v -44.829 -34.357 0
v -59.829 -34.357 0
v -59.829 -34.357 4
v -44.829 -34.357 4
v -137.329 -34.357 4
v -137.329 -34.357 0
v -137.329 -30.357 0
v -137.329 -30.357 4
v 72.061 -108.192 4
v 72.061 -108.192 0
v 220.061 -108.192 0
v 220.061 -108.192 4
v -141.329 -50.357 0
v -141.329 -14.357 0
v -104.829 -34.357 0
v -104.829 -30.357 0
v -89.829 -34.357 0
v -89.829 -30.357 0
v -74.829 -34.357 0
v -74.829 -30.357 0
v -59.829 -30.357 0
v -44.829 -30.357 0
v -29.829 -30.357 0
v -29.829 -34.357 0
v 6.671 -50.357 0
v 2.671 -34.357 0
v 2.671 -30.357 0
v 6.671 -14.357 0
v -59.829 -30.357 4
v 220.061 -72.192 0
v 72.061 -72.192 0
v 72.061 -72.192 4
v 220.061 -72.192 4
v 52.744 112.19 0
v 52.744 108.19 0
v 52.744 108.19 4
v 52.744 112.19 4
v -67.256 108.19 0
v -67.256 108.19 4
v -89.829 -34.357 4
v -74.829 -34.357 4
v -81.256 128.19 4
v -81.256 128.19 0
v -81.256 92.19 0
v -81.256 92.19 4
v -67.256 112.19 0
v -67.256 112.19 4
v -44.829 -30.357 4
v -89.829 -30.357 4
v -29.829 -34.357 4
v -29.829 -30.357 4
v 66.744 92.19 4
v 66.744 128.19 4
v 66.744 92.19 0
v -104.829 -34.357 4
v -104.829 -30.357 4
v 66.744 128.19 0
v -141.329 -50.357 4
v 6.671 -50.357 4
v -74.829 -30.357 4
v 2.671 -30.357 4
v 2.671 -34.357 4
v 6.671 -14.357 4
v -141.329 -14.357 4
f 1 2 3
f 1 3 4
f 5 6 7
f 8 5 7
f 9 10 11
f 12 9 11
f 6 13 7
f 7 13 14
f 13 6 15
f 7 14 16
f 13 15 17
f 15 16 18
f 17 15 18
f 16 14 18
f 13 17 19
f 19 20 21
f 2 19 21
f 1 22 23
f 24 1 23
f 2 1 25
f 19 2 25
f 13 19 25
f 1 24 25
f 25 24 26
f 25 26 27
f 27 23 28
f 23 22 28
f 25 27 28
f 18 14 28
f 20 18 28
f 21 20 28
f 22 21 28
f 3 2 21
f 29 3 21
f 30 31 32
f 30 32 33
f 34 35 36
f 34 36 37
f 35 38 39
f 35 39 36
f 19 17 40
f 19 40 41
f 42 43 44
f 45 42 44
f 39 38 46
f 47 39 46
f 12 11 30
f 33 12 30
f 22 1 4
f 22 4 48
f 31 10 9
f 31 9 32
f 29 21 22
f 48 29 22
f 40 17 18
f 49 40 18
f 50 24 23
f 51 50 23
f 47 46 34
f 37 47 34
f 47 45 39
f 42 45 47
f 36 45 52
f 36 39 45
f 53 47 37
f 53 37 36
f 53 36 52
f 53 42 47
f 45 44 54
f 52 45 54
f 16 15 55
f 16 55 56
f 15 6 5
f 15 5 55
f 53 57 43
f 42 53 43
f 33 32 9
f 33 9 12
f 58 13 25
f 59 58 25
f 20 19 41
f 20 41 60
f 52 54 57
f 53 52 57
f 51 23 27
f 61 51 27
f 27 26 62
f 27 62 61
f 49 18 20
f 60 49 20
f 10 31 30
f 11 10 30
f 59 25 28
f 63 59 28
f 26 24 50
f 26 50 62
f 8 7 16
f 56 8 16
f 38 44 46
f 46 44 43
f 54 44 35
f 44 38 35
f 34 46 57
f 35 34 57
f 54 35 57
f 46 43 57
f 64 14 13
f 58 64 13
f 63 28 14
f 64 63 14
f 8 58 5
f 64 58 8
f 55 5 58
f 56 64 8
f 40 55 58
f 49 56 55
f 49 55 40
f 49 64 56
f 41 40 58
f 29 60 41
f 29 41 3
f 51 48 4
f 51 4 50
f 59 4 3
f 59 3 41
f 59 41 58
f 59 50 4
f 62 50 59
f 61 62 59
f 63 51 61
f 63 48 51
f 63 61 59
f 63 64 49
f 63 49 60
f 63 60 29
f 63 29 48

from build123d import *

# Parameters (mm, degrees)
F0_W     = 32.5
F0_H     = 4
F0_W_2   = 15
F1_DEPTH = 4
F2_W     = 120
F2_H     = 4
F3_DEPTH = 4
F4_W     = 148
F4_H     = 36
F5_DEPTH = 4


with BuildPart() as f1:
    # F0 (on Top) → F1 (new body)
    with BuildSketch(Plane.XY):
        Polygon((6.67144, -30.356686), (6.67144, -14.356686), (-141.32856, -14.356686), (-141.32856, -30.356686), (-141.32856, -34.356686), (-141.32856, -50.356686), (6.67144, -50.356686), (6.67144, -34.356686), align=None)
        with Locations((-121.07856, -32.356686)):
            Rectangle(F0_W, F0_H, mode=Mode.SUBTRACT)
        with Locations((-82.32856, -32.356686)):
            Rectangle(F0_W_2, F0_H, mode=Mode.SUBTRACT)
        with Locations((-52.32856, -32.356686)):
            Rectangle(F0_W_2, F0_H, mode=Mode.SUBTRACT)
        with Locations((-13.57856, -32.356686)):
            Rectangle(F0_W, F0_H, mode=Mode.SUBTRACT)
    extrude(amount=F1_DEPTH)


with BuildPart() as f3:
    # F2 (on Top) → F3 (new body)
    with BuildSketch(Plane.XY):
        Polygon((66.743938, 112.19028), (66.743938, 128.19028), (-81.256062, 128.19028), (-81.256062, 112.19028), (-81.256062, 108.19028), (-81.256062, 92.19028), (66.743938, 92.19028), (66.743938, 108.19028), align=None)
        with Locations((-7.256062, 110.19028)):
            Rectangle(F2_W, F2_H, mode=Mode.SUBTRACT)
    extrude(amount=F3_DEPTH)


with BuildPart() as f5:
    # F4 (on Top) → F5 (new body)
    with BuildSketch(Plane.XY):
        with Locations((146.060839, -90.192072)):
            Rectangle(F4_W, F4_H)
    extrude(amount=F5_DEPTH)


solid = Compound([f1.part, f3.part, f5.part])
